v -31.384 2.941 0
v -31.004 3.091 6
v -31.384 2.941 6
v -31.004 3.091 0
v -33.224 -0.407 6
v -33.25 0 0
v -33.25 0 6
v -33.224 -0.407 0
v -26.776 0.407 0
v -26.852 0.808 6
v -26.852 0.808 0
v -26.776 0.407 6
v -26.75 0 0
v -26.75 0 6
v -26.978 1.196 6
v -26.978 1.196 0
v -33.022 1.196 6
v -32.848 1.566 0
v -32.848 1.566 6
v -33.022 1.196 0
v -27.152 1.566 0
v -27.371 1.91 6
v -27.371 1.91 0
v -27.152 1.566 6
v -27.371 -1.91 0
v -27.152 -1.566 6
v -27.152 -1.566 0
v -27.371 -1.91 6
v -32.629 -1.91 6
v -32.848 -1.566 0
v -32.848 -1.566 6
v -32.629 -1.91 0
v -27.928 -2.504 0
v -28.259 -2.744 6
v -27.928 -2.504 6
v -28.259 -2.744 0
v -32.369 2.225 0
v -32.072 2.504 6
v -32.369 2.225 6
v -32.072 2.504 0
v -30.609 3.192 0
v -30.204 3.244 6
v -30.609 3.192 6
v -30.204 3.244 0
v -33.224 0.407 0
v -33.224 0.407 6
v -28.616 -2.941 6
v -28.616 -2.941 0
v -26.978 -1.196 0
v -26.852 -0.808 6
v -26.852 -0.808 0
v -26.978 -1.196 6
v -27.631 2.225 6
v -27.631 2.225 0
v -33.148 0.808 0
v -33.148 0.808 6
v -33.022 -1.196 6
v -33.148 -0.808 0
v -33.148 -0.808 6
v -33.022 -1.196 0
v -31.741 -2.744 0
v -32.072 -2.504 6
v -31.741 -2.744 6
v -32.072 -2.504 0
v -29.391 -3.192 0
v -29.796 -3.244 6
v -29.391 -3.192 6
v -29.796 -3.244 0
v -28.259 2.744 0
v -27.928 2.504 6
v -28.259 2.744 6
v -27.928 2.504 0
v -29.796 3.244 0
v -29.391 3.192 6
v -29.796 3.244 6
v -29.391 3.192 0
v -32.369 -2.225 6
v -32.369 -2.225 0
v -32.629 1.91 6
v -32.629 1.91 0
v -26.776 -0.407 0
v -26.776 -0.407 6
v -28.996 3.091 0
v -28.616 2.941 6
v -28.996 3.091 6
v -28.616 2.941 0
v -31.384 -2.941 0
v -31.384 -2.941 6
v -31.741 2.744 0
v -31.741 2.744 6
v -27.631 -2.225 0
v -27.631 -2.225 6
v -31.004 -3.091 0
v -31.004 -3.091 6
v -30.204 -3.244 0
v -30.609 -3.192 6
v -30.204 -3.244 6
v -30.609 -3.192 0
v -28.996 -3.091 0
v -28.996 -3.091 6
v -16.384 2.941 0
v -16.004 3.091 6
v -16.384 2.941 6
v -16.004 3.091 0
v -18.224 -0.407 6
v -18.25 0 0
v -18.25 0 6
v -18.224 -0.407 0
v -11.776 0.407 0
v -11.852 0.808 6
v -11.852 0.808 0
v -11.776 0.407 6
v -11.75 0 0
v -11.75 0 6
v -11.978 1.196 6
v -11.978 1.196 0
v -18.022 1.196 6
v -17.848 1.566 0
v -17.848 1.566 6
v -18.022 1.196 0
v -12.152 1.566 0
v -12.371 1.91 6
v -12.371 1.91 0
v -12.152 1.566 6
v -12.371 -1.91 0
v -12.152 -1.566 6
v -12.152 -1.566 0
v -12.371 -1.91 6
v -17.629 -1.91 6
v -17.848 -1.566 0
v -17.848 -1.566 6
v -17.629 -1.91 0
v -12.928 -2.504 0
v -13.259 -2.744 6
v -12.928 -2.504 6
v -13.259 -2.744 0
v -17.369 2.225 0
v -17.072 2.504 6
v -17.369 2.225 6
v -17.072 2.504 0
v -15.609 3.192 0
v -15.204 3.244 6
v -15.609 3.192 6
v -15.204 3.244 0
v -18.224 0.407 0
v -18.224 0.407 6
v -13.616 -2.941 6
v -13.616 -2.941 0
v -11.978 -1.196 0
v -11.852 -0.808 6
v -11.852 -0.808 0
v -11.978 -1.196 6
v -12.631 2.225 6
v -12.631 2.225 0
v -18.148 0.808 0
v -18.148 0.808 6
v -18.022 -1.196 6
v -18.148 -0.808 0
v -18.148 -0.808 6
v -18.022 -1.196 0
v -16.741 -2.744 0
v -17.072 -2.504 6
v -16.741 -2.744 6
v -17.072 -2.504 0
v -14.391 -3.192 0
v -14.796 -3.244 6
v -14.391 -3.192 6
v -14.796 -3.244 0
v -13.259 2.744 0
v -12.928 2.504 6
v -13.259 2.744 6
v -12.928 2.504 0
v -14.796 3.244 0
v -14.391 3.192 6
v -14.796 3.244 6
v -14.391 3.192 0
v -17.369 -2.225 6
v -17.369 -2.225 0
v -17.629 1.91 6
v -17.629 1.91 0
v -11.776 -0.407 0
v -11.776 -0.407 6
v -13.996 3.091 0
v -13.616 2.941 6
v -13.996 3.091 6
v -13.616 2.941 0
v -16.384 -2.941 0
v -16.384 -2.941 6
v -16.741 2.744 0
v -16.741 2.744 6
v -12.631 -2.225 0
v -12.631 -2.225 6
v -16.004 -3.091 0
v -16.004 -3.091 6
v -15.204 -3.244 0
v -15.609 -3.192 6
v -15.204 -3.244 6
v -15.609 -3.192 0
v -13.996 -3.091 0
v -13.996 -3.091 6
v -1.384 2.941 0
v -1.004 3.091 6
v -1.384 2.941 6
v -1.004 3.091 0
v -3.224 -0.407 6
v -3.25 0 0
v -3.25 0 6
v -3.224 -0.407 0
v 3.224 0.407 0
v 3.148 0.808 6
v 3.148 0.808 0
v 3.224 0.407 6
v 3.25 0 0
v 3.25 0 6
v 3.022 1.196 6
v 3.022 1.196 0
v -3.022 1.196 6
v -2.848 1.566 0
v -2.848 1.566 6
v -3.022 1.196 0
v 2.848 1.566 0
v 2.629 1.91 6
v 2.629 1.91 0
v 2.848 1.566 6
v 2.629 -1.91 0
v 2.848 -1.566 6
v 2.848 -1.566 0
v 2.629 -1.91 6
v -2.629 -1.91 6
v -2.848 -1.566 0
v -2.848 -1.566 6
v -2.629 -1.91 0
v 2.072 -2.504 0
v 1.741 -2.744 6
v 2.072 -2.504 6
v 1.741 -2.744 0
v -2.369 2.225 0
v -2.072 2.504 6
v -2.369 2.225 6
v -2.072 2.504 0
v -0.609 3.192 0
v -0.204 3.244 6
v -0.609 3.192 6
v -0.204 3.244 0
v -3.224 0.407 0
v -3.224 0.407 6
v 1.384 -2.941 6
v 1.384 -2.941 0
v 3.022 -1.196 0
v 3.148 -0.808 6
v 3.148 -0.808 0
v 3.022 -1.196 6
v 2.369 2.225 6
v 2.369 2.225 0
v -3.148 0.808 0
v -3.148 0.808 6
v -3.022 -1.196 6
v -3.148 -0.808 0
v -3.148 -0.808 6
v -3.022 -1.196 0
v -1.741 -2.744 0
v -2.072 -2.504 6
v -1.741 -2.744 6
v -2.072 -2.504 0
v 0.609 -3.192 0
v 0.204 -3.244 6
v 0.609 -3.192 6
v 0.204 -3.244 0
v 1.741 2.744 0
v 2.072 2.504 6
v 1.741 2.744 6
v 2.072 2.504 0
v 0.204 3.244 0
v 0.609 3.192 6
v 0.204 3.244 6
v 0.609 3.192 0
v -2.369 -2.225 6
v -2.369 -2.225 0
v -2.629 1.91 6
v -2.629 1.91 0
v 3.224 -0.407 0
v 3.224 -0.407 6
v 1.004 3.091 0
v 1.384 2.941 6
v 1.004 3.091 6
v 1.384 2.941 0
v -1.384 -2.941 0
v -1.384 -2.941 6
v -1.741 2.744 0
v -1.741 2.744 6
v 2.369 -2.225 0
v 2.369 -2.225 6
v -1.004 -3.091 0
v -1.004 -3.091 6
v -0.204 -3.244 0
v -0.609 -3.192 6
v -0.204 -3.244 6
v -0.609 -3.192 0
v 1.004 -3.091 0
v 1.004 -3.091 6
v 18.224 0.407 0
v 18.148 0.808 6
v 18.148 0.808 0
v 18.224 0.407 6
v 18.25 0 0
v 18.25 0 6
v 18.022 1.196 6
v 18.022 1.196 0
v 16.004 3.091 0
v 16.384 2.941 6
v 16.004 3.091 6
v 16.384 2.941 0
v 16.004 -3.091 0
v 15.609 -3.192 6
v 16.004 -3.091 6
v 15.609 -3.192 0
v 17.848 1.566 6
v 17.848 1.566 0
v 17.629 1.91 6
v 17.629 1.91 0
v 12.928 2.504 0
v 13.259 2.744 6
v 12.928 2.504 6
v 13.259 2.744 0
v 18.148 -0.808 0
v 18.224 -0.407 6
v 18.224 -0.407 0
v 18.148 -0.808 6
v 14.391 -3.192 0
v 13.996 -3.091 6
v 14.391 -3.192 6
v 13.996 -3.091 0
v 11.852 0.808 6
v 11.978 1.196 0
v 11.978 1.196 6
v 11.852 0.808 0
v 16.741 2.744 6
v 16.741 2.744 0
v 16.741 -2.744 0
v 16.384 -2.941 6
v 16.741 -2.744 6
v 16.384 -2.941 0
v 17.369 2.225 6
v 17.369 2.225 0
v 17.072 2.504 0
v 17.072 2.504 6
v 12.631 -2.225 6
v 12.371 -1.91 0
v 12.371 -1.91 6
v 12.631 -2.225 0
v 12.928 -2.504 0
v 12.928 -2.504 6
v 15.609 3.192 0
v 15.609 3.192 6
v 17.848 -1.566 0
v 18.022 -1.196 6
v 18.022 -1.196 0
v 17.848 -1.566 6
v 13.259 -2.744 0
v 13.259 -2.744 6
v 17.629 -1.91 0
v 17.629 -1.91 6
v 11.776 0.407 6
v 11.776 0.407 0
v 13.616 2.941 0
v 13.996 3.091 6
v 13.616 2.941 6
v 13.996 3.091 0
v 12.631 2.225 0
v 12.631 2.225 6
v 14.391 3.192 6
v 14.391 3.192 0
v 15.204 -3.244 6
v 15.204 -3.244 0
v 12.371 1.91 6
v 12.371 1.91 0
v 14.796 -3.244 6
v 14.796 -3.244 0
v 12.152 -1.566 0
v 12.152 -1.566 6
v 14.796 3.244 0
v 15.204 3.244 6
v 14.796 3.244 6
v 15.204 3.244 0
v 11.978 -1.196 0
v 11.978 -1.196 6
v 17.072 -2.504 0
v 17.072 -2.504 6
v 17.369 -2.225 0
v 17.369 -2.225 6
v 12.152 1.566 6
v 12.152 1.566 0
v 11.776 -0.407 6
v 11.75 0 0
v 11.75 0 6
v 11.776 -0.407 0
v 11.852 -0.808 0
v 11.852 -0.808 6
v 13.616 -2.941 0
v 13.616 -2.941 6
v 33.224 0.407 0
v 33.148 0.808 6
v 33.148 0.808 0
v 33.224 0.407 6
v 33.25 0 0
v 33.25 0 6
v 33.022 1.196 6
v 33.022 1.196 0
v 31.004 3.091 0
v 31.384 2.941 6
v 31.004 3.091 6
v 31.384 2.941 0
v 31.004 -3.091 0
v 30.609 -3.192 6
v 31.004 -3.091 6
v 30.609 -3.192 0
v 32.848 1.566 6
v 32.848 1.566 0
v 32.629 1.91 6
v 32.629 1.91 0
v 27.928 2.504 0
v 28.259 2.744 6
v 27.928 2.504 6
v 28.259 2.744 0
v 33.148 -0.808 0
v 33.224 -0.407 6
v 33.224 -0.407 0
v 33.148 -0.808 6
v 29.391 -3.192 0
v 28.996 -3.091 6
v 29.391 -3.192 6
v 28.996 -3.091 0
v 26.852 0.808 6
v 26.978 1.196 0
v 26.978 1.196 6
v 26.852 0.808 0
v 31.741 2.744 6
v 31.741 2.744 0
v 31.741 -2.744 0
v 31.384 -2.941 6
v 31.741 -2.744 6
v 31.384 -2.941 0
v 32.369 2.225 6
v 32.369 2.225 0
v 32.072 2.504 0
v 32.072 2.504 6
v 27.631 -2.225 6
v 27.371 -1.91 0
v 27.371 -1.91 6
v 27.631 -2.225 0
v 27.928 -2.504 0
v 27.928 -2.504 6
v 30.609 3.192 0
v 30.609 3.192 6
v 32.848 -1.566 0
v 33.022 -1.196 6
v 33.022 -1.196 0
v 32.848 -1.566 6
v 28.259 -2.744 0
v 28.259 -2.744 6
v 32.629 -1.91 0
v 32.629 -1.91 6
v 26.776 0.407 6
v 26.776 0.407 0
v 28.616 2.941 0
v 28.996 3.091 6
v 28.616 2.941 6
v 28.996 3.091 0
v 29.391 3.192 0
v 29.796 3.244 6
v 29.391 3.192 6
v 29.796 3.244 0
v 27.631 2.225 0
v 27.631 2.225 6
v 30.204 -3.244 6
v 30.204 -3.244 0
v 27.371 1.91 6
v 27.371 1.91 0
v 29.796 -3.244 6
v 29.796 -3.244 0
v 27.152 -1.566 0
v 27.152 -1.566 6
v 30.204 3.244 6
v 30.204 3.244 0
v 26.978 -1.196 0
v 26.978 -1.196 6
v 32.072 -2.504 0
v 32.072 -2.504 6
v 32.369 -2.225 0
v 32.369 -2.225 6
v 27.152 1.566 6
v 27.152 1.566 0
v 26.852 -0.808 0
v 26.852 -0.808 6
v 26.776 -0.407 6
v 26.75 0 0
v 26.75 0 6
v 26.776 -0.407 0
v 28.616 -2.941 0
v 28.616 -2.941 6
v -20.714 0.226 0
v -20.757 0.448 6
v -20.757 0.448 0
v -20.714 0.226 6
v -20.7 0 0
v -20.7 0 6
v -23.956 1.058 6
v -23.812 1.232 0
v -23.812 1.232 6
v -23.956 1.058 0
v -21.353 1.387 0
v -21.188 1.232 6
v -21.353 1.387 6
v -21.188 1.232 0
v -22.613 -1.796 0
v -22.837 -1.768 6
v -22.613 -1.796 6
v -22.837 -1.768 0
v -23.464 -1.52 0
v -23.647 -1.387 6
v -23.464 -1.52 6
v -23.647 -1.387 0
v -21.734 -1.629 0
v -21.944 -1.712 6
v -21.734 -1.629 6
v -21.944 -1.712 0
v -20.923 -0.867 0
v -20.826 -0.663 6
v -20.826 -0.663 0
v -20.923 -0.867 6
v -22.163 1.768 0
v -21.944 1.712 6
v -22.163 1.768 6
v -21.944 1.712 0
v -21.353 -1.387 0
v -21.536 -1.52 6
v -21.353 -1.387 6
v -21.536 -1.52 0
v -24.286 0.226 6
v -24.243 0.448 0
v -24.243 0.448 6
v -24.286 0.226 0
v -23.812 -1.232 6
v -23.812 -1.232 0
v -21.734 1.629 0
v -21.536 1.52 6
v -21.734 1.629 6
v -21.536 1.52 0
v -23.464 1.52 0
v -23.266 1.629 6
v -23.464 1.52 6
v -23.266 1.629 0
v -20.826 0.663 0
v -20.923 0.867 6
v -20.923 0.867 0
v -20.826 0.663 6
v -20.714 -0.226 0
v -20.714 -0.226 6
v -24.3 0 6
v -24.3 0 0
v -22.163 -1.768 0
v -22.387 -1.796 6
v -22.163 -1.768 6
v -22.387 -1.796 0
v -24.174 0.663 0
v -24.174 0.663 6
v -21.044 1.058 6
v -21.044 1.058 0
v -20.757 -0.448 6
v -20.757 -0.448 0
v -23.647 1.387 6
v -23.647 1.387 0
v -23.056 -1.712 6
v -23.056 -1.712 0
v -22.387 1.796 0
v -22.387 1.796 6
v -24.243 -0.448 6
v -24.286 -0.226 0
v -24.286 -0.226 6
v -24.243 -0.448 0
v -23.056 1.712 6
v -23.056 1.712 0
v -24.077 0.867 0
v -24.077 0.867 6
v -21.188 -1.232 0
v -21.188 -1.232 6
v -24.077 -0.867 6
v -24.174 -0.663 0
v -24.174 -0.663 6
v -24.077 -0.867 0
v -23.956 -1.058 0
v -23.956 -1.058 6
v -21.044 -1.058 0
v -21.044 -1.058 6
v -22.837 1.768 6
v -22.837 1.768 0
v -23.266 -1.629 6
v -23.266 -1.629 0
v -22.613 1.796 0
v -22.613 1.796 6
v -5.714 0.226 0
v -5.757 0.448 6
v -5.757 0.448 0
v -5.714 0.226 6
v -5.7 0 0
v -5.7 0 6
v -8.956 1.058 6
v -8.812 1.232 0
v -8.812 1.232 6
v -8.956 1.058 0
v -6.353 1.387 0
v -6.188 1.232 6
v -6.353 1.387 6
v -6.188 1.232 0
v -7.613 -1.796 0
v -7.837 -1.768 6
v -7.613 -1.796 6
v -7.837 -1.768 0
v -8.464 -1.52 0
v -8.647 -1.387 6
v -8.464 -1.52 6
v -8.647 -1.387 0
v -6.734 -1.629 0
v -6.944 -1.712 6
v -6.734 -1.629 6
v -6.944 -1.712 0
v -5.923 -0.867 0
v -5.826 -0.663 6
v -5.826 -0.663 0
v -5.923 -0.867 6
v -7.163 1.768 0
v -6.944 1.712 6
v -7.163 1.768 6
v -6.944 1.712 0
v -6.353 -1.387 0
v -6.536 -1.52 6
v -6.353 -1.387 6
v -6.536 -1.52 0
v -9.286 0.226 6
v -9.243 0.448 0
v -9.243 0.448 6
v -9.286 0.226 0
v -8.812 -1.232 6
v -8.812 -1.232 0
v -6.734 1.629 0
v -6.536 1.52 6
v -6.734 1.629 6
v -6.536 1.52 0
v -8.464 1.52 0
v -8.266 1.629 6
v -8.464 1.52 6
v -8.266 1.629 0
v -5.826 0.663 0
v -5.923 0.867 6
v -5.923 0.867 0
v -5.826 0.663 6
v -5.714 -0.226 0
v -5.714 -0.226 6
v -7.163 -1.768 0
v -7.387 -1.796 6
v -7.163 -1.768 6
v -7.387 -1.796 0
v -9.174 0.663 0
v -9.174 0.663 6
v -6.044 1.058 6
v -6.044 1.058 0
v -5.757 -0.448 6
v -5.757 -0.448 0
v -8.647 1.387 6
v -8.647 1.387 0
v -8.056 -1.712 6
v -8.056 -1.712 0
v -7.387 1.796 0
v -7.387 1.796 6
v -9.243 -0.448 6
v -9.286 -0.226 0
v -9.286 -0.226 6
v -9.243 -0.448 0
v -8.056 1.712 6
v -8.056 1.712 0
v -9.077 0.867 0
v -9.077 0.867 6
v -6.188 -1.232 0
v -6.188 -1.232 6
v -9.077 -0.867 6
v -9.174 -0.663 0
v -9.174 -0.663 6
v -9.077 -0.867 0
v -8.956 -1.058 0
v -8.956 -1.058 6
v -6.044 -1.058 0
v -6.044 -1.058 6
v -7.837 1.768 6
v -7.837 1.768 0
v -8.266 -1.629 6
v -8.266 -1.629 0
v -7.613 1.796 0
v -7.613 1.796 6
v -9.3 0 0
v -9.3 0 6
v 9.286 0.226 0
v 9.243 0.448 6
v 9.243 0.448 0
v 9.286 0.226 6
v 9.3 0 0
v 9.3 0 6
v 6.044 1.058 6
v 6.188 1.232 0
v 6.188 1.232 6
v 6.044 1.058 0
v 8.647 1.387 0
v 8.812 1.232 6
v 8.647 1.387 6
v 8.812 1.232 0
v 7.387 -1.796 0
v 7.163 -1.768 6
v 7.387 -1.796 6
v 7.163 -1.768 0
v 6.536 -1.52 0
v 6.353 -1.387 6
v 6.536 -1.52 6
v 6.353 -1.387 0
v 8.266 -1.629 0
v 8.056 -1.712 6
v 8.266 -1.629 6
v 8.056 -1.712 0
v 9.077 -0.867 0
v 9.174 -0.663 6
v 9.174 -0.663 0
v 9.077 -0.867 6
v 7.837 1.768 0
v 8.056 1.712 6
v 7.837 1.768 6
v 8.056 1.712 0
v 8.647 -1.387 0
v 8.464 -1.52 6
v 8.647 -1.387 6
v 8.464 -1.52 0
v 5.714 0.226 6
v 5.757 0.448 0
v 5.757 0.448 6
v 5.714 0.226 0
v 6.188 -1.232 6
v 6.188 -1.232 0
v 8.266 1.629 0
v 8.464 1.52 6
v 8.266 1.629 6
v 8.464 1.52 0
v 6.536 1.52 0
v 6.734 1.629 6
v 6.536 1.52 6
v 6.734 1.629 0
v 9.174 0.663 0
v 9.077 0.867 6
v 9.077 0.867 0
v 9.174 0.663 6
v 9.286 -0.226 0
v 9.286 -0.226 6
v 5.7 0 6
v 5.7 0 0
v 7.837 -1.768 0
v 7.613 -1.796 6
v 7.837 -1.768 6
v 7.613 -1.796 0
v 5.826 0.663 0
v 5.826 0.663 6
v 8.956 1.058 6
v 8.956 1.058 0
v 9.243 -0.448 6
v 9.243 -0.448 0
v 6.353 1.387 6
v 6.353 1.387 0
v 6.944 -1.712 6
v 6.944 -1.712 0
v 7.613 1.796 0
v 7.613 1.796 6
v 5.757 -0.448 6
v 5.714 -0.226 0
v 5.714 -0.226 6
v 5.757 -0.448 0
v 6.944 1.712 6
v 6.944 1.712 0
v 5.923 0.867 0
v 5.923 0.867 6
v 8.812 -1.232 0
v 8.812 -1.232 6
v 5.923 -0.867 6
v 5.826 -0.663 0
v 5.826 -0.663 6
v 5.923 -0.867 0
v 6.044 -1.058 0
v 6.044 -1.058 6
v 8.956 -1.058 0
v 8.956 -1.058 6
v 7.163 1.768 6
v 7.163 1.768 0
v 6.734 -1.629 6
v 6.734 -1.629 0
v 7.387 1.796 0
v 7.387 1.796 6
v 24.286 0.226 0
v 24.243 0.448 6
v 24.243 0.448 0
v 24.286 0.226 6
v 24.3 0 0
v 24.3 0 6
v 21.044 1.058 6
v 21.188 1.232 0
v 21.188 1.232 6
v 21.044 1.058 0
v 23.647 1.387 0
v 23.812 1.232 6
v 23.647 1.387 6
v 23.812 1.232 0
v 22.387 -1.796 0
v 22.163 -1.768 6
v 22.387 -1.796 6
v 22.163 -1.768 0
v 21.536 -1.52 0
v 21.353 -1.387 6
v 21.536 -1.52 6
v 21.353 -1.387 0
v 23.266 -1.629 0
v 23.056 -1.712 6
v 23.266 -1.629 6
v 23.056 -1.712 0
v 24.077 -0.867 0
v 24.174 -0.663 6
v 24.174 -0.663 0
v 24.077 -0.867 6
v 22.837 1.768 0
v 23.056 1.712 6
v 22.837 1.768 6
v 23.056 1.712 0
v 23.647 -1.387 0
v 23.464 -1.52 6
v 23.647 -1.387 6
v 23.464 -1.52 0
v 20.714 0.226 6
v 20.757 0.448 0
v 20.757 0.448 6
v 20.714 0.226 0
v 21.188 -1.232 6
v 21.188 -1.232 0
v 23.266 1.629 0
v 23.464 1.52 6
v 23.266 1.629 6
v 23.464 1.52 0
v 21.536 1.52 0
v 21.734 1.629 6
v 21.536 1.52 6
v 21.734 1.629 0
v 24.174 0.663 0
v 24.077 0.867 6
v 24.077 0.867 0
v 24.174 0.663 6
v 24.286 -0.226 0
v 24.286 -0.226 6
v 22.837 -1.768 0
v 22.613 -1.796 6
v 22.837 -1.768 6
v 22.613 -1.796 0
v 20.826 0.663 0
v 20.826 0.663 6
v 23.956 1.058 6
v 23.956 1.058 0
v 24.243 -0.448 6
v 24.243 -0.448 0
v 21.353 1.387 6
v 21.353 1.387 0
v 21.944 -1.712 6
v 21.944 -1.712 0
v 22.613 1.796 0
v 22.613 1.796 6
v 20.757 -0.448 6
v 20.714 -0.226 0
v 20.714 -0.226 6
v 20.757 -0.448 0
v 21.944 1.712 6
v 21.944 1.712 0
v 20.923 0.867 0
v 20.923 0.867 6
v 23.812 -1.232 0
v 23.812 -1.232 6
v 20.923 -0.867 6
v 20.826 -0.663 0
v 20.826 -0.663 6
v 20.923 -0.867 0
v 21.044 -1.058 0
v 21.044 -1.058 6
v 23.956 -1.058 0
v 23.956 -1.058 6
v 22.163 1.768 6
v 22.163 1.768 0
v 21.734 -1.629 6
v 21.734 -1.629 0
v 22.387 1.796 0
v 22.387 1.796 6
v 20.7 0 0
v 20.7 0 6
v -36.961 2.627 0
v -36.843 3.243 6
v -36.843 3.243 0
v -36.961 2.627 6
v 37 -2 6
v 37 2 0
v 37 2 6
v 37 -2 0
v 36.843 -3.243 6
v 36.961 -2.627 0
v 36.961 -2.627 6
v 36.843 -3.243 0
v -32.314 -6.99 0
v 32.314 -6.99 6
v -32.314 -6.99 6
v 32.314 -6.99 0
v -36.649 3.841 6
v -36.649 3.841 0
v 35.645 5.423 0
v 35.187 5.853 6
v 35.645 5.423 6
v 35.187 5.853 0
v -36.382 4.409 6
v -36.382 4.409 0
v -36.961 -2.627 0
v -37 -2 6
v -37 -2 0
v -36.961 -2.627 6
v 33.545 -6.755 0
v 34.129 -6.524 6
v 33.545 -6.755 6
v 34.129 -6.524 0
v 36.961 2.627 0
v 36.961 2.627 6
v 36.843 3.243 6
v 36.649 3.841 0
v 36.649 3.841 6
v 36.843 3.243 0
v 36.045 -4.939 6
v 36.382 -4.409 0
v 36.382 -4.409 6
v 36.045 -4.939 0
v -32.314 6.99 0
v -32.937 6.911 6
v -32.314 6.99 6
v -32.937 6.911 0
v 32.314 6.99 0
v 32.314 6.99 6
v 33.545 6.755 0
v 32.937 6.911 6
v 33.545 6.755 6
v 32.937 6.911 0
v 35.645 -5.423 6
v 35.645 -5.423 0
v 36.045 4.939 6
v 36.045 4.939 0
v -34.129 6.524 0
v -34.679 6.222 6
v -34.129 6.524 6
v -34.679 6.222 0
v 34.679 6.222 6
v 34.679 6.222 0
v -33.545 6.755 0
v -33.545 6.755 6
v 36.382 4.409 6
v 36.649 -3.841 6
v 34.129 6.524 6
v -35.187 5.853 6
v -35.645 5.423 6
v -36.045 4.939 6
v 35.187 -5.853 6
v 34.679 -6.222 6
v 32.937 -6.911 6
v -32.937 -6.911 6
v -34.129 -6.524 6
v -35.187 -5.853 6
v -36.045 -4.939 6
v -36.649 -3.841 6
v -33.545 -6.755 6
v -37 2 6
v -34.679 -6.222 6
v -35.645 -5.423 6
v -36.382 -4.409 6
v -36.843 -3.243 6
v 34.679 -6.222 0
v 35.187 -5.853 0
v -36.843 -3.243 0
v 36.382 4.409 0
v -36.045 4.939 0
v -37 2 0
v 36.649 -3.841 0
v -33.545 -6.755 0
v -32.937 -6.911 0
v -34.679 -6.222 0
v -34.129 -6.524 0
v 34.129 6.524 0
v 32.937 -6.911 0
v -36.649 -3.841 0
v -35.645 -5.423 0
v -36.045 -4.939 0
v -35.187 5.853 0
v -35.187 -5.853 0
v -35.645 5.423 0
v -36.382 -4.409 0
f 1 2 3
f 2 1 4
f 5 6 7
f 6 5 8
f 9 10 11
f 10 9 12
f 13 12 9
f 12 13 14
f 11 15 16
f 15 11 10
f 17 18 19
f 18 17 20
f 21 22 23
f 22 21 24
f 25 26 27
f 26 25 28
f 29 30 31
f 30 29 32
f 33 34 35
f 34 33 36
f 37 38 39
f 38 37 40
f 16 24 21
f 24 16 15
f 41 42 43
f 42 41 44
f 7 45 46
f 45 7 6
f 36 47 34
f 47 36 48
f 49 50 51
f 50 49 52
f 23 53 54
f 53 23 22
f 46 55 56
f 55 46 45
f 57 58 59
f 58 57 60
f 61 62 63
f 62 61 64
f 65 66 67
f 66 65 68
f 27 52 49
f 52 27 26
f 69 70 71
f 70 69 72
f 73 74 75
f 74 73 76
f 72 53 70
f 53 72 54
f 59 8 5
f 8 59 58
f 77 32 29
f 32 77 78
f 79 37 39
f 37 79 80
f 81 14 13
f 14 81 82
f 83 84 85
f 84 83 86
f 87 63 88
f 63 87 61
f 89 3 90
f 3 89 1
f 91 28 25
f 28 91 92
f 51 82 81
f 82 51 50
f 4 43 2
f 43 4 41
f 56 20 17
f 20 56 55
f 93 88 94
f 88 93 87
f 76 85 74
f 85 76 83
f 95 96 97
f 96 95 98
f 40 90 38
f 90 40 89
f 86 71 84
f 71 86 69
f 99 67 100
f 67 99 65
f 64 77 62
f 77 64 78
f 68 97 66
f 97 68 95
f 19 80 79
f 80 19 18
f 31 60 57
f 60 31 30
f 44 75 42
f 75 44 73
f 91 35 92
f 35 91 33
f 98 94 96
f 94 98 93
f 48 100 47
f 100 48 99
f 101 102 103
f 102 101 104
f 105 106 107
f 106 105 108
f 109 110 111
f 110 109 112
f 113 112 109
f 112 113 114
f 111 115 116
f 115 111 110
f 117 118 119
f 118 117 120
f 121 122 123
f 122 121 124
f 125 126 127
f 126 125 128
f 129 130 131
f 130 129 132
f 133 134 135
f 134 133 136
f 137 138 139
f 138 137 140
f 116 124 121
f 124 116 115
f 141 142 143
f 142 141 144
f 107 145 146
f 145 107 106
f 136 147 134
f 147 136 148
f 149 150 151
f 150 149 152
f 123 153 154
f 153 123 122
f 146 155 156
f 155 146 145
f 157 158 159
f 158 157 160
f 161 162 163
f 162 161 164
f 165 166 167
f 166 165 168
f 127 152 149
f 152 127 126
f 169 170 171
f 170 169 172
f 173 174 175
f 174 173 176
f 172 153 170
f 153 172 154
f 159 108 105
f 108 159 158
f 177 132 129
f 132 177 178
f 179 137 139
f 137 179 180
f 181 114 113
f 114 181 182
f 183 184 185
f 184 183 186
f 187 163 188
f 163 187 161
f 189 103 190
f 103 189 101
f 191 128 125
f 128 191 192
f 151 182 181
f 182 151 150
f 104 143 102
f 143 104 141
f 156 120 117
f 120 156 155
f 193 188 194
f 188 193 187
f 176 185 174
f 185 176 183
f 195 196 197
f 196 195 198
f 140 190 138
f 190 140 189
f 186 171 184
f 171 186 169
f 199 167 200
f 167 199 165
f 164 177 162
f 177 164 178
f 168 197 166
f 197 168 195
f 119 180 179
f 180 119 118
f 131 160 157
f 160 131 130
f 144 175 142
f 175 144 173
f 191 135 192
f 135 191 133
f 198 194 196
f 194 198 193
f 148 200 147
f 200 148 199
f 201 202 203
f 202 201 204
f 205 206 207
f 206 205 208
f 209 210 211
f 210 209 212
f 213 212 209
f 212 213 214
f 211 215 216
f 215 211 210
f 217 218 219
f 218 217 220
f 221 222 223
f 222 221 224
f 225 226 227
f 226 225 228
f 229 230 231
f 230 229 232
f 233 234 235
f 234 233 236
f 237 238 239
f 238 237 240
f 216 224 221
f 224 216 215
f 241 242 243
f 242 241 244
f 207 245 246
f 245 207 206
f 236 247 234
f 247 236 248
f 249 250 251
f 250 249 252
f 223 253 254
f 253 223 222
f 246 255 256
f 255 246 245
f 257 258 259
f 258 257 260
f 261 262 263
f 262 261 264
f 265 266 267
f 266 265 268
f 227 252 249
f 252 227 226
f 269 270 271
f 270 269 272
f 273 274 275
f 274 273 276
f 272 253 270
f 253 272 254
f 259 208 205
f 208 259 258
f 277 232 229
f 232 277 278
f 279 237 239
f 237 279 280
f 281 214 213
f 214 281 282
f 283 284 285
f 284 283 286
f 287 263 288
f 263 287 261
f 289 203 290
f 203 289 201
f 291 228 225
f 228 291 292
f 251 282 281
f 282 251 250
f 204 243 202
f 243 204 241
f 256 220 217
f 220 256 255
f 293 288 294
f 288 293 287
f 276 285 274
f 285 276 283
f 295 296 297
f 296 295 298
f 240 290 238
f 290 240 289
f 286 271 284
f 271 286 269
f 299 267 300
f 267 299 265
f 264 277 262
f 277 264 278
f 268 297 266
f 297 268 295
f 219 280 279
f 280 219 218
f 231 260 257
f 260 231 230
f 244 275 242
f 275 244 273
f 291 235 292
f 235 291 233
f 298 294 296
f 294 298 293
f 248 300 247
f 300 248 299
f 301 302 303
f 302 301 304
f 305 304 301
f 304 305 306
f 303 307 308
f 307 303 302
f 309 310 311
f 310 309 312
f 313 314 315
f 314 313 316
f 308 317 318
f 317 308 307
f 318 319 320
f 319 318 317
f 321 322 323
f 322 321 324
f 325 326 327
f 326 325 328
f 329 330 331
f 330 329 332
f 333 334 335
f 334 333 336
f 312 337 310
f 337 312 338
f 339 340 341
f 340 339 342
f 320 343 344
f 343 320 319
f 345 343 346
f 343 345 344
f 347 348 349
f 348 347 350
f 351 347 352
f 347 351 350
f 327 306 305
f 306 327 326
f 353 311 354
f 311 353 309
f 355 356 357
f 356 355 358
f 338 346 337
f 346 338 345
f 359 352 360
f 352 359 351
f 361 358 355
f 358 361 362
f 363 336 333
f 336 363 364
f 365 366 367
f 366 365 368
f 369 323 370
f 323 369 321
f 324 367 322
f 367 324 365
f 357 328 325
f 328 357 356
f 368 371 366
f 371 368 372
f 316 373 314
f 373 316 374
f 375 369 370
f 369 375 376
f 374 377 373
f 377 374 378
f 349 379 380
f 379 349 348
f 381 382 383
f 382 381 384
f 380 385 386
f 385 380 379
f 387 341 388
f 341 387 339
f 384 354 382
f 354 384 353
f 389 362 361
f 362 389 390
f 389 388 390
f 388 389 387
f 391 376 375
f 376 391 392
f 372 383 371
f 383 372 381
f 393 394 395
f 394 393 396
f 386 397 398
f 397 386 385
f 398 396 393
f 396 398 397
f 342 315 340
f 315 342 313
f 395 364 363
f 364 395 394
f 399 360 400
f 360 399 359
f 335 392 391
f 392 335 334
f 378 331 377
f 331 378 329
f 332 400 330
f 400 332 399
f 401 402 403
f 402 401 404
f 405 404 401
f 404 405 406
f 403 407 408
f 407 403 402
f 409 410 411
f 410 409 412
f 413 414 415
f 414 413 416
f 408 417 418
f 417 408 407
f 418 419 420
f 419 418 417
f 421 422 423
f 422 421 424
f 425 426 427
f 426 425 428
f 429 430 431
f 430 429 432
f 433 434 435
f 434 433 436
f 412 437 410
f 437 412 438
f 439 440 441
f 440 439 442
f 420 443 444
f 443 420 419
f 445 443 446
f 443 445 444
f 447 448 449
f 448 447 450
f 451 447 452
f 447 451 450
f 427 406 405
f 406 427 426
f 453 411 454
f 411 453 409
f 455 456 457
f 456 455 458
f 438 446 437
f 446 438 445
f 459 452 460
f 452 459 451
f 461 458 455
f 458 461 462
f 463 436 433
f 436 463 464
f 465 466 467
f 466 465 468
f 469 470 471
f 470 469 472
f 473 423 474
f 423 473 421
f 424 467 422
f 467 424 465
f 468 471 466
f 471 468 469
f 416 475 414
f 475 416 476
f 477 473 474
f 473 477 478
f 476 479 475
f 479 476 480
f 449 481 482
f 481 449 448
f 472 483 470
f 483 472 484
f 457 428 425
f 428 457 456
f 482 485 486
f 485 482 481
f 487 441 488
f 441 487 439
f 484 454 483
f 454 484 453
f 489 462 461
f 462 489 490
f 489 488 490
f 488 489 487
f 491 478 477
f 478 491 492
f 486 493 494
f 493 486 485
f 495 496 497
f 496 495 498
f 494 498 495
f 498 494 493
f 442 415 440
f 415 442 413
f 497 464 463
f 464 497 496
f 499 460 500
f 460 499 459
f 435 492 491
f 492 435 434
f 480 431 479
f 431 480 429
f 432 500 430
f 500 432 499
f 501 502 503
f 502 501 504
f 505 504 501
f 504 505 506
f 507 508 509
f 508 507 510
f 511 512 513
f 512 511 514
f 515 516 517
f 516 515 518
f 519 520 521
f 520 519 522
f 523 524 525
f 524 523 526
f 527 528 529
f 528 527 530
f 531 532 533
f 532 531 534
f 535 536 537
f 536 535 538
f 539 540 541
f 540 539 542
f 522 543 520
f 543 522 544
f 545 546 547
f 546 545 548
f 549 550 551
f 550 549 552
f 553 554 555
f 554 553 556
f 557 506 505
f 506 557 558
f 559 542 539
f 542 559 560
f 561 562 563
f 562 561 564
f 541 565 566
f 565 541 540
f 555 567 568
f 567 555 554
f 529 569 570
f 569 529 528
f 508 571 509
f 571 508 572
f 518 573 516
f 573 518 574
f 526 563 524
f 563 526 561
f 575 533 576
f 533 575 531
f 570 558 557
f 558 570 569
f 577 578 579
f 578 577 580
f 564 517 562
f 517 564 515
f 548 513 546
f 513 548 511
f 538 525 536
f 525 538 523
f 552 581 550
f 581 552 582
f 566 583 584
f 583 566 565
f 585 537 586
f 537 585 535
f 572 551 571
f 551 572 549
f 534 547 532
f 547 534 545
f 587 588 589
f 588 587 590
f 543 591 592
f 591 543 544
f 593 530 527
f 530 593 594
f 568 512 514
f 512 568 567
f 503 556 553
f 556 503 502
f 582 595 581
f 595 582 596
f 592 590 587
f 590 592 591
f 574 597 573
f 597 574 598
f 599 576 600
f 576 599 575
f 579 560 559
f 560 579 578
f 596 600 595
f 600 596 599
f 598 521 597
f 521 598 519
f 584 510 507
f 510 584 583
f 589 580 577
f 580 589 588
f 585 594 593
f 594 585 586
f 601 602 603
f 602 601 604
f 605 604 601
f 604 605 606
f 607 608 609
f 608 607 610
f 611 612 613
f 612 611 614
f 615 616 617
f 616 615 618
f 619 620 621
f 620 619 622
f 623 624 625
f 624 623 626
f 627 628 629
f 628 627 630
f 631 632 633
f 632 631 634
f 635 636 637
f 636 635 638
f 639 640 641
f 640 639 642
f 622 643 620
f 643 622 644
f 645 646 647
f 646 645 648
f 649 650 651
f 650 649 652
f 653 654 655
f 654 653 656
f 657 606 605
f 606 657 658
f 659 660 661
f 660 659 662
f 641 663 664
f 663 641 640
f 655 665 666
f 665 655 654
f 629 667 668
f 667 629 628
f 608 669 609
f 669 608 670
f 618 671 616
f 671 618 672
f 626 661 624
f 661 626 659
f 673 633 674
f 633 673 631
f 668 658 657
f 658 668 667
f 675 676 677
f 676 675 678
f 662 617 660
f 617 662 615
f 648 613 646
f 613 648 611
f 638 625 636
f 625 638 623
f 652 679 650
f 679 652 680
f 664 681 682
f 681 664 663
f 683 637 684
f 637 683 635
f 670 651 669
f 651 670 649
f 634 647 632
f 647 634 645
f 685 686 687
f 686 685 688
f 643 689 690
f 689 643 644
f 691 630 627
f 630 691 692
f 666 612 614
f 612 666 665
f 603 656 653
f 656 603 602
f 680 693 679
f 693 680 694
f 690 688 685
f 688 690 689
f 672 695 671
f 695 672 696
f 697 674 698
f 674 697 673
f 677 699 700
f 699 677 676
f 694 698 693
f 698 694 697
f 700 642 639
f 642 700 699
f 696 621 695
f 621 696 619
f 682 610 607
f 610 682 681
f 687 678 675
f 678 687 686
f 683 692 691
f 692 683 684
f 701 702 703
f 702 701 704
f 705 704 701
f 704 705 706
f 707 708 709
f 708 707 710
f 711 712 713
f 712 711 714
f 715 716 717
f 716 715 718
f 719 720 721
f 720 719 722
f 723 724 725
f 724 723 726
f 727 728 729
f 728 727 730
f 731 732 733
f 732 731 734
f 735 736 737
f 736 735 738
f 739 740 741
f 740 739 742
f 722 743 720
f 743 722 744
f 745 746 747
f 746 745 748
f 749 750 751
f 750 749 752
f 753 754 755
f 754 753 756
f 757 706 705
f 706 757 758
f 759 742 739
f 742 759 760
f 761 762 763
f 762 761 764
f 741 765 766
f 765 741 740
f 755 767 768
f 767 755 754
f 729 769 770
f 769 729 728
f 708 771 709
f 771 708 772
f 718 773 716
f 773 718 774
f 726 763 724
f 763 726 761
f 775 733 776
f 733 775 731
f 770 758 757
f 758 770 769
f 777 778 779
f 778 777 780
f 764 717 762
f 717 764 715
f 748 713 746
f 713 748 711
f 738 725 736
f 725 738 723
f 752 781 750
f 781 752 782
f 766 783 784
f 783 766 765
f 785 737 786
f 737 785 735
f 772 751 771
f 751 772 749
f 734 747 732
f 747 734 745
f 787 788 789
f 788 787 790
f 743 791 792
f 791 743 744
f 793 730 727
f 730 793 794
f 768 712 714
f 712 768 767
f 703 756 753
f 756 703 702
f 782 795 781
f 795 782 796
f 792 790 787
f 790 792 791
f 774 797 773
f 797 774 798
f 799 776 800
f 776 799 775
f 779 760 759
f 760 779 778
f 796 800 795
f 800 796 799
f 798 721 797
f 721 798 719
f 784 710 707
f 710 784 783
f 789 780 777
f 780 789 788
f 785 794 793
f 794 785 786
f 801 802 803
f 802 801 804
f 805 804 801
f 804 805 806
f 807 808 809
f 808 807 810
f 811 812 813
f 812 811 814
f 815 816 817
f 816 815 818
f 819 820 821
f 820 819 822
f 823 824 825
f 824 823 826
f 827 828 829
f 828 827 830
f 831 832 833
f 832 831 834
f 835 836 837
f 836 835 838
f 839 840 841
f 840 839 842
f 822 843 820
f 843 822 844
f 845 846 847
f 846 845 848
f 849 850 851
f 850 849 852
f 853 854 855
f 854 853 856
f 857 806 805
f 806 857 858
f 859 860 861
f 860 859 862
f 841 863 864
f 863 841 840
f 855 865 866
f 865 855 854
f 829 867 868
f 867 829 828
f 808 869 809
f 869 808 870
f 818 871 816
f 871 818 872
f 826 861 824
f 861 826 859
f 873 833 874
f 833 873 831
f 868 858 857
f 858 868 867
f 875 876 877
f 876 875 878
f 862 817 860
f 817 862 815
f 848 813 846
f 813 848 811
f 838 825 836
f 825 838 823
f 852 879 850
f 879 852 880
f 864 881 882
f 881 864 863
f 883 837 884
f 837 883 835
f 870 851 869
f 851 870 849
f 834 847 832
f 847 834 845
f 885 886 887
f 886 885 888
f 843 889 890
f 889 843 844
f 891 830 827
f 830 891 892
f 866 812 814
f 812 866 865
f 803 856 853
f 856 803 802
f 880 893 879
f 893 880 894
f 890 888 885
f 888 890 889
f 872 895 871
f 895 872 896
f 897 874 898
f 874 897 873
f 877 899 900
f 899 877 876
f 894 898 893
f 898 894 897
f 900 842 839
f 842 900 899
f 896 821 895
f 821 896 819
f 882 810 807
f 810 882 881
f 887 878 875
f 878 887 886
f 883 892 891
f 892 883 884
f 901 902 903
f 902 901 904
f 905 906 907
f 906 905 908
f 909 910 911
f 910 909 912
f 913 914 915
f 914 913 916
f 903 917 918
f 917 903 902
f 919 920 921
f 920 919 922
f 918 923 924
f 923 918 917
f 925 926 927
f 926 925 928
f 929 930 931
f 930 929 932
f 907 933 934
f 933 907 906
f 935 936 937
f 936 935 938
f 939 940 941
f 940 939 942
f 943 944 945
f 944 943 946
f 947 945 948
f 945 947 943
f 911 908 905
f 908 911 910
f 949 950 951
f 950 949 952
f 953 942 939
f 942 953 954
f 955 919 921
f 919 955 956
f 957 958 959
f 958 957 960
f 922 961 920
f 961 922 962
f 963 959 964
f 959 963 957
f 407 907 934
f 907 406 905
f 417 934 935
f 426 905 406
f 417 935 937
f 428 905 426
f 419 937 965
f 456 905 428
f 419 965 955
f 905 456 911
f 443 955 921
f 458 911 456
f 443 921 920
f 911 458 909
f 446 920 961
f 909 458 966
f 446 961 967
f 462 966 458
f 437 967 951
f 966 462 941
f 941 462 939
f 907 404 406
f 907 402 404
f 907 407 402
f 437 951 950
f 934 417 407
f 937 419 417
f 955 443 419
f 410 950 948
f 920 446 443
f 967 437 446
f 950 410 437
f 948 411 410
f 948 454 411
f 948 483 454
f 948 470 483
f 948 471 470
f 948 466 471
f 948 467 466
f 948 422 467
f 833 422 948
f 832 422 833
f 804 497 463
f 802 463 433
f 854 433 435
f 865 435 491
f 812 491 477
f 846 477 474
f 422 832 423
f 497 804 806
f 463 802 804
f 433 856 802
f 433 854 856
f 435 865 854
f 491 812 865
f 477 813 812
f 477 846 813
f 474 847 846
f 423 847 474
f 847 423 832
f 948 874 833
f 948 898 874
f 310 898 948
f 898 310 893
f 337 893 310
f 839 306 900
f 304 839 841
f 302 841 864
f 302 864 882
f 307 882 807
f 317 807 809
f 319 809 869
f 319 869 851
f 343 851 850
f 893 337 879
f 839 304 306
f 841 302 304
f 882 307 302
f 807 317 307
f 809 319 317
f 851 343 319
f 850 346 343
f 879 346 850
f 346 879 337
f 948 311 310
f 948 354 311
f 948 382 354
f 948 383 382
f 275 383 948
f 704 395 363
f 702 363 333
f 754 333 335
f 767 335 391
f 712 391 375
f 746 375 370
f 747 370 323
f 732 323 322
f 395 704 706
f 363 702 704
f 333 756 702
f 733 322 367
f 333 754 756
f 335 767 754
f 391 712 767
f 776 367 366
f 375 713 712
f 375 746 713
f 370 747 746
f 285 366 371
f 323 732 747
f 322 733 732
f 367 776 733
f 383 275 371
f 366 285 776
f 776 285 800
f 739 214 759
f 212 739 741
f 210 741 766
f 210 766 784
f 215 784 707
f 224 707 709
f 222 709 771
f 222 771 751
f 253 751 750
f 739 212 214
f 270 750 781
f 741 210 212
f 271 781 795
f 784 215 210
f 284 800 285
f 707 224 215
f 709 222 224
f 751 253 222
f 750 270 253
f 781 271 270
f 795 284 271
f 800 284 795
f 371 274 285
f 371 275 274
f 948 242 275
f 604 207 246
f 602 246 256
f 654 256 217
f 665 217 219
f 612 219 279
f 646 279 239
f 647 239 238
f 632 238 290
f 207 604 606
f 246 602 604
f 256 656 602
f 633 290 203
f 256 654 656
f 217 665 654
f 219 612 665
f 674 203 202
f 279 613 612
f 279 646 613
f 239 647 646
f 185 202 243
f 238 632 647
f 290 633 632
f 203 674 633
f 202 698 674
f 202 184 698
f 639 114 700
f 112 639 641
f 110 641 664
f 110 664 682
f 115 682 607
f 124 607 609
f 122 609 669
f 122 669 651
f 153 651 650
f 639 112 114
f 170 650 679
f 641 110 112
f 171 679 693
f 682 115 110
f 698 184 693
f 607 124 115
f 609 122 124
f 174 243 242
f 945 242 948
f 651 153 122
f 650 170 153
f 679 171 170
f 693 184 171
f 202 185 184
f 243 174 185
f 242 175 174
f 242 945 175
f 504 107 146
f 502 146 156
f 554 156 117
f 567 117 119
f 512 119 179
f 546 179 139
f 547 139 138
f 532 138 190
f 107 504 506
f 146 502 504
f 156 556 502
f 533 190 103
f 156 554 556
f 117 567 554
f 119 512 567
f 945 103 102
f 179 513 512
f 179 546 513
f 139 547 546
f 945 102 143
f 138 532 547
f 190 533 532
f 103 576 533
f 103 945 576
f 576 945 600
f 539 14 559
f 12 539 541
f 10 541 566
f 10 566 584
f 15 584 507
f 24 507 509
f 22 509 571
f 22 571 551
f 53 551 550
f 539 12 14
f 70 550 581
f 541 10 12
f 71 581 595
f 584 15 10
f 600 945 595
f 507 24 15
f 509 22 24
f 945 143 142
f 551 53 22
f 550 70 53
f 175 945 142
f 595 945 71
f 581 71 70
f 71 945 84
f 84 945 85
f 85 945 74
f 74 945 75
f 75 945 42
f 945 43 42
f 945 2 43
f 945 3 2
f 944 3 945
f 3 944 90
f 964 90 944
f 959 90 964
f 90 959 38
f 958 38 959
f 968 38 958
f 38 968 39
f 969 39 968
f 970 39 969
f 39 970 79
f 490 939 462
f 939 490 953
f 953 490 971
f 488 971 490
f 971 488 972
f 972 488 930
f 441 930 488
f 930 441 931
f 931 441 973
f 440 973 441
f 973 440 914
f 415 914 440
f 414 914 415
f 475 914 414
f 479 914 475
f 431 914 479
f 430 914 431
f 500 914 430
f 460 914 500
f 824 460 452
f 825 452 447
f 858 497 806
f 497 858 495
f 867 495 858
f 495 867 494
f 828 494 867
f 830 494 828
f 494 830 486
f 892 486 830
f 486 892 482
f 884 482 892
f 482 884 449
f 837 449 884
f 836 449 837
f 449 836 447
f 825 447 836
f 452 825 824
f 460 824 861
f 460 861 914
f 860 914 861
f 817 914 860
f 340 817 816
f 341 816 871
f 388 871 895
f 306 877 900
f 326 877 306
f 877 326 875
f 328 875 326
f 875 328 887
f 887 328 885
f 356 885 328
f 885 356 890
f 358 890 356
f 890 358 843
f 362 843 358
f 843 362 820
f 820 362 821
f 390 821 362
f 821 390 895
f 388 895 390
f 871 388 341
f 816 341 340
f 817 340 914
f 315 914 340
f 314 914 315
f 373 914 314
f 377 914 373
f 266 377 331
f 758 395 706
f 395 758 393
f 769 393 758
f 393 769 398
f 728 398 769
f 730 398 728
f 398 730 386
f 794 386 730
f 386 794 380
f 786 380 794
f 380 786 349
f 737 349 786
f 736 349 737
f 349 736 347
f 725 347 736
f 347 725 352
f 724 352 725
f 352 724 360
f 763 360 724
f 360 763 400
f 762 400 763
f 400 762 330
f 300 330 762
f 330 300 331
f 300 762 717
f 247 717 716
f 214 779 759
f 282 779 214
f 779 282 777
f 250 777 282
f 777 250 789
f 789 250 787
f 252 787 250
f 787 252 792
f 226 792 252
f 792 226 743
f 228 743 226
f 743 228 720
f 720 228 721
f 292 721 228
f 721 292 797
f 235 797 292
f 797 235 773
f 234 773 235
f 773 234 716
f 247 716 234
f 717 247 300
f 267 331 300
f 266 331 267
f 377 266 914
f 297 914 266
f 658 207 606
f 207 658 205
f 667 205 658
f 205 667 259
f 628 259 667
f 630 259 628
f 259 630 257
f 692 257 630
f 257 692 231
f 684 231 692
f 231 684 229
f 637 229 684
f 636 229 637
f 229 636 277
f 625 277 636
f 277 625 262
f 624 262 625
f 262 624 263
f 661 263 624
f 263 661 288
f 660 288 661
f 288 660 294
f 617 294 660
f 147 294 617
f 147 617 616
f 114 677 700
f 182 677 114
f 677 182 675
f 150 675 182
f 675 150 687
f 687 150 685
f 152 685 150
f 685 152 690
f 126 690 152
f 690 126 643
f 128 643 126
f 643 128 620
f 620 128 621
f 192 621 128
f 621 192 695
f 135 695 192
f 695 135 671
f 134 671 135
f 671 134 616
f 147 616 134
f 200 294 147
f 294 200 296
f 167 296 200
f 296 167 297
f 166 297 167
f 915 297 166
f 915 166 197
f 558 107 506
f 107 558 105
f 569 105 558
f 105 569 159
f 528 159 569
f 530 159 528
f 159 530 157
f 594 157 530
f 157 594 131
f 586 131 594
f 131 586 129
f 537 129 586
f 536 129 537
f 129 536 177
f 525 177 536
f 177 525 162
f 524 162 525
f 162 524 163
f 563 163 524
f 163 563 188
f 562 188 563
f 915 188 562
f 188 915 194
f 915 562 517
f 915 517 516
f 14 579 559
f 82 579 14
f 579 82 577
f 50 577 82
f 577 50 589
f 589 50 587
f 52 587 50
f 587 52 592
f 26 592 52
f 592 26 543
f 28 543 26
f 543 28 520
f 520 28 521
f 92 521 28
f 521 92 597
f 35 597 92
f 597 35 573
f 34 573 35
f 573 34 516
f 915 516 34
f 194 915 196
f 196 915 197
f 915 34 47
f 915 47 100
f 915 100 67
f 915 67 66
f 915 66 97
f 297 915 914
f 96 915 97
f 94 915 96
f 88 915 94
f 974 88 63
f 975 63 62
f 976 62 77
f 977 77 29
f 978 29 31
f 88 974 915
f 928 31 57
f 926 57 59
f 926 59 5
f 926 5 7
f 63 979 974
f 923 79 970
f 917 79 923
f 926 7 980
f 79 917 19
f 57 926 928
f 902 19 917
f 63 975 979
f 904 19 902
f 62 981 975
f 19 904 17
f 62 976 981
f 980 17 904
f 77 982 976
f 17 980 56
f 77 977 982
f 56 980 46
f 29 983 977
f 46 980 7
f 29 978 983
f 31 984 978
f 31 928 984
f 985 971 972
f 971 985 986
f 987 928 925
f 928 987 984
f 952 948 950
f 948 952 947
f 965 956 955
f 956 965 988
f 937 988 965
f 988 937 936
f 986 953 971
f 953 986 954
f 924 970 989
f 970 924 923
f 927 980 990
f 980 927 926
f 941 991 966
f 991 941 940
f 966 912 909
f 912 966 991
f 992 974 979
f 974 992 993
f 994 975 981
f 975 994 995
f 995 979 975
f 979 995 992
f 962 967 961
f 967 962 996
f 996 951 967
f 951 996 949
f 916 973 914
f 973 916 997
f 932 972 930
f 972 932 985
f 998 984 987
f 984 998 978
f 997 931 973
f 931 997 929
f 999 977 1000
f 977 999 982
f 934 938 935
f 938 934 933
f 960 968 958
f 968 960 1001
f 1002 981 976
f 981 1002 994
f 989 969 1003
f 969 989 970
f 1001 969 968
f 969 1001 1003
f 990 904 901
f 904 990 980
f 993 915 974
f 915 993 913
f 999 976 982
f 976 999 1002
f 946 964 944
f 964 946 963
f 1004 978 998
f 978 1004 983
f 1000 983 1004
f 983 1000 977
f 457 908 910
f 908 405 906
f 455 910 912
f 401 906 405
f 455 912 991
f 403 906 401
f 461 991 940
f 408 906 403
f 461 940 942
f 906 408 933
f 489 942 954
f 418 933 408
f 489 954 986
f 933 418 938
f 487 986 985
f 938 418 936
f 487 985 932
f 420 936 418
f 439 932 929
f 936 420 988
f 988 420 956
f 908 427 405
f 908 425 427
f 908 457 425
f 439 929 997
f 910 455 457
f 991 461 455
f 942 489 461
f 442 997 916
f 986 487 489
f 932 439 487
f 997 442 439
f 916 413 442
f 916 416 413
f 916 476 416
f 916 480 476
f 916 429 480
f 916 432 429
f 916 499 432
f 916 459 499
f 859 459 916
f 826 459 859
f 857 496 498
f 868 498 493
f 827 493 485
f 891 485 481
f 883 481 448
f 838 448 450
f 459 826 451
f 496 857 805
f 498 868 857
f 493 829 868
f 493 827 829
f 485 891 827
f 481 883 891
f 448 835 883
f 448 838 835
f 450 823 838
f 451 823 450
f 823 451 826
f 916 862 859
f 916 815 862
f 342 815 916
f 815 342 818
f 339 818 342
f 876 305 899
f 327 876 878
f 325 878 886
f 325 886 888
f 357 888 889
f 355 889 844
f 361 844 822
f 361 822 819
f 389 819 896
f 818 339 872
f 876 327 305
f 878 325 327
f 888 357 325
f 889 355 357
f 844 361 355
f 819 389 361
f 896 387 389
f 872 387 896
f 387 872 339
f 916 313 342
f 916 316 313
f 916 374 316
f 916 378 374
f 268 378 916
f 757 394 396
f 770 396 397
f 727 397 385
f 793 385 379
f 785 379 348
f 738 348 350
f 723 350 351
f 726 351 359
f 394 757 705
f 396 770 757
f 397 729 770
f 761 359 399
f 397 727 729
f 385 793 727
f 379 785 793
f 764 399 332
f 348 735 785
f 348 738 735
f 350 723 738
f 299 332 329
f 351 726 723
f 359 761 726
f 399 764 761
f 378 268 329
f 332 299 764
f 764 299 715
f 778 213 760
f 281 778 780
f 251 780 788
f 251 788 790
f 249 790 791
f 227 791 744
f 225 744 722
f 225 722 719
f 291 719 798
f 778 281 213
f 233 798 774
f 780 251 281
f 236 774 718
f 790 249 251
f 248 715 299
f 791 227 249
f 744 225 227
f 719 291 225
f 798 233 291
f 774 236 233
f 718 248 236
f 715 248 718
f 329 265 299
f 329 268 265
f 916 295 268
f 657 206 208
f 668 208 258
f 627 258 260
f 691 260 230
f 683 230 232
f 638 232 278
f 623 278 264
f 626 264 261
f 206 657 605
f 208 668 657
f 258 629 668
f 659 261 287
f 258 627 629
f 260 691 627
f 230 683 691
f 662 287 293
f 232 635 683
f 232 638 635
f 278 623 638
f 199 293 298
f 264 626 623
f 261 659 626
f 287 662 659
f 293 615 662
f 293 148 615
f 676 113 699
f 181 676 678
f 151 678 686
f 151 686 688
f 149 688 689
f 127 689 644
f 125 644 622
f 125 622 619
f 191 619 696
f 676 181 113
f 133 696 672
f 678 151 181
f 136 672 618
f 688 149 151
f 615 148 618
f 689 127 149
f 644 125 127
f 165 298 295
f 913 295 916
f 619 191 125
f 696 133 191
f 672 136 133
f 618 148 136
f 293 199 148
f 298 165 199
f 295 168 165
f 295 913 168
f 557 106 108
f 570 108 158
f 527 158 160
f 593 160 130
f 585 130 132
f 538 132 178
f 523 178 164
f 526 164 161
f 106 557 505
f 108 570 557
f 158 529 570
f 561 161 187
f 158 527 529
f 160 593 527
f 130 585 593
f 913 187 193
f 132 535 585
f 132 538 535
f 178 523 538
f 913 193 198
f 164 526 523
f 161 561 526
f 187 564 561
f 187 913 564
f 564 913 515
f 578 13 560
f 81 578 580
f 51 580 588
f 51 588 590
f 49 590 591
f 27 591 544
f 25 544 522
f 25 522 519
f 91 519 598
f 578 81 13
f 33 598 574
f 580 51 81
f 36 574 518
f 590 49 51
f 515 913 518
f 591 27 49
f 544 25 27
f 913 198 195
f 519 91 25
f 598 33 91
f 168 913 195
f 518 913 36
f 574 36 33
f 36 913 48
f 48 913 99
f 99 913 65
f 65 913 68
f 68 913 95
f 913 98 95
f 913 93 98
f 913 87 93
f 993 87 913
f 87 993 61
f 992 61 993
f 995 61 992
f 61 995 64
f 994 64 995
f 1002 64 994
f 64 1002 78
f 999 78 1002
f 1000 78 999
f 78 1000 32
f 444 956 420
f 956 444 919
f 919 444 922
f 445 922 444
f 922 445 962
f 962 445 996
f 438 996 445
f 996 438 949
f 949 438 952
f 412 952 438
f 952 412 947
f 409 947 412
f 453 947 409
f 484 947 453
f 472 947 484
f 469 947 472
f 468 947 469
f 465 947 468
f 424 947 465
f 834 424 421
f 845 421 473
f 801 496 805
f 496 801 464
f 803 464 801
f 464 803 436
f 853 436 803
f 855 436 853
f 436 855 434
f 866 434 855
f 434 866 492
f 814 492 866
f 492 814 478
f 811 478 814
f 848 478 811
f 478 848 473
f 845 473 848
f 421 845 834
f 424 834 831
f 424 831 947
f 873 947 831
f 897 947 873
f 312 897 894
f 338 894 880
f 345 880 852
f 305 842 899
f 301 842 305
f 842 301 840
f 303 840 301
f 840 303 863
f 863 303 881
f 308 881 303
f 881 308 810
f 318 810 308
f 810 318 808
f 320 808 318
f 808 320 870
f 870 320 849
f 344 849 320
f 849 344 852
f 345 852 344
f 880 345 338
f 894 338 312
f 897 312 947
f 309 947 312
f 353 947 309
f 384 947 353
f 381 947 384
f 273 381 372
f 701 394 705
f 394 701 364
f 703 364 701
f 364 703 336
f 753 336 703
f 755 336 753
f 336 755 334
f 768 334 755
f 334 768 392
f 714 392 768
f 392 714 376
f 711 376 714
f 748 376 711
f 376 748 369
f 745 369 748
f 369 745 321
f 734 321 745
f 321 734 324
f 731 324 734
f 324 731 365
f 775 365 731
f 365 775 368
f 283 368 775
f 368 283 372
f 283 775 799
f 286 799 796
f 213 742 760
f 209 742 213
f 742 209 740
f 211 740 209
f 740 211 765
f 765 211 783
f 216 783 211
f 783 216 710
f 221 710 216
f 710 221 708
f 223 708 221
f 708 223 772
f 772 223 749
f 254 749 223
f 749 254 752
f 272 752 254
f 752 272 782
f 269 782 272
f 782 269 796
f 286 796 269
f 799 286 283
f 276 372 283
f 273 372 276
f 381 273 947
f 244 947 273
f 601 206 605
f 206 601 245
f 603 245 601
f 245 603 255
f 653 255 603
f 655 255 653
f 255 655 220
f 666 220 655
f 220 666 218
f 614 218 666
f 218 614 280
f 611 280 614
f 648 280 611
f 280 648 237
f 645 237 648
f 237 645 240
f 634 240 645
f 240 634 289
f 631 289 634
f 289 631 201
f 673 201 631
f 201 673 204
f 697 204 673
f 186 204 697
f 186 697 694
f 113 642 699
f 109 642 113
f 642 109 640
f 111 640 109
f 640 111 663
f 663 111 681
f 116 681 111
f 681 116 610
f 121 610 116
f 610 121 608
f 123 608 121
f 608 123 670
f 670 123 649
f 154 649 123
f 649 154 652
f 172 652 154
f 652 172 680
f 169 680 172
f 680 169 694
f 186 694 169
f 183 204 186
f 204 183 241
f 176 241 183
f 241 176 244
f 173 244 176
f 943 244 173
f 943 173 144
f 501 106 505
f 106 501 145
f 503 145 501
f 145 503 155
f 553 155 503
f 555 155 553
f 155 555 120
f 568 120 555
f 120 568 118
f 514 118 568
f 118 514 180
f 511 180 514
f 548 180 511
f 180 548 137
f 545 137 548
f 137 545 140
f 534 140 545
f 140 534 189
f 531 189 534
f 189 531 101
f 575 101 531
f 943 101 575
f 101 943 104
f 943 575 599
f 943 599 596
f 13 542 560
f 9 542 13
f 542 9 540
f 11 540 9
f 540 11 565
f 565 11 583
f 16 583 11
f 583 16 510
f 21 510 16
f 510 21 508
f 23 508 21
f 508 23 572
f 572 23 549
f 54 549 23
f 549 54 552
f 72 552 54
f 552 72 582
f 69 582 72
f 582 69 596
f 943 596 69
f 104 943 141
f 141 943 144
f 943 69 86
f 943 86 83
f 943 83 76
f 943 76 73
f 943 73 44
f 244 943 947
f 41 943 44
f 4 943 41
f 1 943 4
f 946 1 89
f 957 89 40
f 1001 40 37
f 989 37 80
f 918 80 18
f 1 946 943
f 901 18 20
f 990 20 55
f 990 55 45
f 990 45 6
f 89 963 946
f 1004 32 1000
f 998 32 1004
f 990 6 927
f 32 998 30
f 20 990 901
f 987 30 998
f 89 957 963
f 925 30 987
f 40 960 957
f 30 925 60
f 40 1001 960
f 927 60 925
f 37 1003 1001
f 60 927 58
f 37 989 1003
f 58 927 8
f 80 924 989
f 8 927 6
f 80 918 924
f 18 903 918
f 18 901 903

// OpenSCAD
$fn = 50;


difference() {
	union() {
		*color(alpha = 1.0000000000, c = "gray") {
			translate(v = [0, 7, 0]) {
				linear_extrude(height = 1) {
					text(font = "Arial:style=Bold", halign = "center", size = 4.5000000000, text = "COMMENT plate main", valign = "center");
				}
			}
		}
		hull() {
			translate(v = [-32.0000000000, 2.0000000000, 0]) {
				cylinder(h = 6, r = 5);
			}
			translate(v = [32.0000000000, 2.0000000000, 0]) {
				cylinder(h = 6, r = 5);
			}
			translate(v = [-32.0000000000, -2.0000000000, 0]) {
				cylinder(h = 6, r = 5);
			}
			translate(v = [32.0000000000, -2.0000000000, 0]) {
				cylinder(h = 6, r = 5);
			}
		}
	}
	union() {
		*color(alpha = 1.0000000000, c = "gray") {
			translate(v = [0, 7, 0]) {
				linear_extrude(height = 1) {
					text(font = "Arial:style=Bold", halign = "center", size = 4.5000000000, text = "COMMENT holes main", valign = "center");
				}
			}
		}
		translate(v = [-30.0000000000, 0.0000000000, 0]) {
			translate(v = [0, 0, -100]) {
				cylinder(h = 200, r = 3.2500000000);
			}
		}
		translate(v = [-15.0000000000, 0.0000000000, 0]) {
			translate(v = [0, 0, -100]) {
				cylinder(h = 200, r = 3.2500000000);
			}
		}
		translate(v = [0, 0, -100]) {
			cylinder(h = 200, r = 3.2500000000);
		}
		translate(v = [15.0000000000, 0.0000000000, 0]) {
			translate(v = [0, 0, -100]) {
				cylinder(h = 200, r = 3.2500000000);
			}
		}
		translate(v = [30.0000000000, 0.0000000000, 0]) {
			translate(v = [0, 0, -100]) {
				cylinder(h = 200, r = 3.2500000000);
			}
		}
		translate(v = [-30.0000000000, 0.0000000000, 0]) {
			translate(v = [0, 0, -100]) {
				cylinder(h = 200, r = 1.8000000000);
			}
		}
		translate(v = [-22.5000000000, 0.0000000000, 0]) {
			translate(v = [0, 0, -100]) {
				cylinder(h = 200, r = 1.8000000000);
			}
		}
		translate(v = [-15.0000000000, 0.0000000000, 0]) {
			translate(v = [0, 0, -100]) {
				cylinder(h = 200, r = 1.8000000000);
			}
		}
		translate(v = [-7.5000000000, 0.0000000000, 0]) {
			translate(v = [0, 0, -100]) {
				cylinder(h = 200, r = 1.8000000000);
			}
		}
		translate(v = [0, 0, -100]) {
			cylinder(h = 200, r = 1.8000000000);
		}
		translate(v = [7.5000000000, 0.0000000000, 0]) {
			translate(v = [0, 0, -100]) {
				cylinder(h = 200, r = 1.8000000000);
			}
		}
		translate(v = [15.0000000000, 0.0000000000, 0]) {
			translate(v = [0, 0, -100]) {
				cylinder(h = 200, r = 1.8000000000);
			}
		}
		translate(v = [22.5000000000, 0.0000000000, 0]) {
			translate(v = [0, 0, -100]) {
				cylinder(h = 200, r = 1.8000000000);
			}
		}
		translate(v = [30.0000000000, 0.0000000000, 0]) {
			translate(v = [0, 0, -100]) {
				cylinder(h = 200, r = 1.8000000000);
			}
		}
	}
}
